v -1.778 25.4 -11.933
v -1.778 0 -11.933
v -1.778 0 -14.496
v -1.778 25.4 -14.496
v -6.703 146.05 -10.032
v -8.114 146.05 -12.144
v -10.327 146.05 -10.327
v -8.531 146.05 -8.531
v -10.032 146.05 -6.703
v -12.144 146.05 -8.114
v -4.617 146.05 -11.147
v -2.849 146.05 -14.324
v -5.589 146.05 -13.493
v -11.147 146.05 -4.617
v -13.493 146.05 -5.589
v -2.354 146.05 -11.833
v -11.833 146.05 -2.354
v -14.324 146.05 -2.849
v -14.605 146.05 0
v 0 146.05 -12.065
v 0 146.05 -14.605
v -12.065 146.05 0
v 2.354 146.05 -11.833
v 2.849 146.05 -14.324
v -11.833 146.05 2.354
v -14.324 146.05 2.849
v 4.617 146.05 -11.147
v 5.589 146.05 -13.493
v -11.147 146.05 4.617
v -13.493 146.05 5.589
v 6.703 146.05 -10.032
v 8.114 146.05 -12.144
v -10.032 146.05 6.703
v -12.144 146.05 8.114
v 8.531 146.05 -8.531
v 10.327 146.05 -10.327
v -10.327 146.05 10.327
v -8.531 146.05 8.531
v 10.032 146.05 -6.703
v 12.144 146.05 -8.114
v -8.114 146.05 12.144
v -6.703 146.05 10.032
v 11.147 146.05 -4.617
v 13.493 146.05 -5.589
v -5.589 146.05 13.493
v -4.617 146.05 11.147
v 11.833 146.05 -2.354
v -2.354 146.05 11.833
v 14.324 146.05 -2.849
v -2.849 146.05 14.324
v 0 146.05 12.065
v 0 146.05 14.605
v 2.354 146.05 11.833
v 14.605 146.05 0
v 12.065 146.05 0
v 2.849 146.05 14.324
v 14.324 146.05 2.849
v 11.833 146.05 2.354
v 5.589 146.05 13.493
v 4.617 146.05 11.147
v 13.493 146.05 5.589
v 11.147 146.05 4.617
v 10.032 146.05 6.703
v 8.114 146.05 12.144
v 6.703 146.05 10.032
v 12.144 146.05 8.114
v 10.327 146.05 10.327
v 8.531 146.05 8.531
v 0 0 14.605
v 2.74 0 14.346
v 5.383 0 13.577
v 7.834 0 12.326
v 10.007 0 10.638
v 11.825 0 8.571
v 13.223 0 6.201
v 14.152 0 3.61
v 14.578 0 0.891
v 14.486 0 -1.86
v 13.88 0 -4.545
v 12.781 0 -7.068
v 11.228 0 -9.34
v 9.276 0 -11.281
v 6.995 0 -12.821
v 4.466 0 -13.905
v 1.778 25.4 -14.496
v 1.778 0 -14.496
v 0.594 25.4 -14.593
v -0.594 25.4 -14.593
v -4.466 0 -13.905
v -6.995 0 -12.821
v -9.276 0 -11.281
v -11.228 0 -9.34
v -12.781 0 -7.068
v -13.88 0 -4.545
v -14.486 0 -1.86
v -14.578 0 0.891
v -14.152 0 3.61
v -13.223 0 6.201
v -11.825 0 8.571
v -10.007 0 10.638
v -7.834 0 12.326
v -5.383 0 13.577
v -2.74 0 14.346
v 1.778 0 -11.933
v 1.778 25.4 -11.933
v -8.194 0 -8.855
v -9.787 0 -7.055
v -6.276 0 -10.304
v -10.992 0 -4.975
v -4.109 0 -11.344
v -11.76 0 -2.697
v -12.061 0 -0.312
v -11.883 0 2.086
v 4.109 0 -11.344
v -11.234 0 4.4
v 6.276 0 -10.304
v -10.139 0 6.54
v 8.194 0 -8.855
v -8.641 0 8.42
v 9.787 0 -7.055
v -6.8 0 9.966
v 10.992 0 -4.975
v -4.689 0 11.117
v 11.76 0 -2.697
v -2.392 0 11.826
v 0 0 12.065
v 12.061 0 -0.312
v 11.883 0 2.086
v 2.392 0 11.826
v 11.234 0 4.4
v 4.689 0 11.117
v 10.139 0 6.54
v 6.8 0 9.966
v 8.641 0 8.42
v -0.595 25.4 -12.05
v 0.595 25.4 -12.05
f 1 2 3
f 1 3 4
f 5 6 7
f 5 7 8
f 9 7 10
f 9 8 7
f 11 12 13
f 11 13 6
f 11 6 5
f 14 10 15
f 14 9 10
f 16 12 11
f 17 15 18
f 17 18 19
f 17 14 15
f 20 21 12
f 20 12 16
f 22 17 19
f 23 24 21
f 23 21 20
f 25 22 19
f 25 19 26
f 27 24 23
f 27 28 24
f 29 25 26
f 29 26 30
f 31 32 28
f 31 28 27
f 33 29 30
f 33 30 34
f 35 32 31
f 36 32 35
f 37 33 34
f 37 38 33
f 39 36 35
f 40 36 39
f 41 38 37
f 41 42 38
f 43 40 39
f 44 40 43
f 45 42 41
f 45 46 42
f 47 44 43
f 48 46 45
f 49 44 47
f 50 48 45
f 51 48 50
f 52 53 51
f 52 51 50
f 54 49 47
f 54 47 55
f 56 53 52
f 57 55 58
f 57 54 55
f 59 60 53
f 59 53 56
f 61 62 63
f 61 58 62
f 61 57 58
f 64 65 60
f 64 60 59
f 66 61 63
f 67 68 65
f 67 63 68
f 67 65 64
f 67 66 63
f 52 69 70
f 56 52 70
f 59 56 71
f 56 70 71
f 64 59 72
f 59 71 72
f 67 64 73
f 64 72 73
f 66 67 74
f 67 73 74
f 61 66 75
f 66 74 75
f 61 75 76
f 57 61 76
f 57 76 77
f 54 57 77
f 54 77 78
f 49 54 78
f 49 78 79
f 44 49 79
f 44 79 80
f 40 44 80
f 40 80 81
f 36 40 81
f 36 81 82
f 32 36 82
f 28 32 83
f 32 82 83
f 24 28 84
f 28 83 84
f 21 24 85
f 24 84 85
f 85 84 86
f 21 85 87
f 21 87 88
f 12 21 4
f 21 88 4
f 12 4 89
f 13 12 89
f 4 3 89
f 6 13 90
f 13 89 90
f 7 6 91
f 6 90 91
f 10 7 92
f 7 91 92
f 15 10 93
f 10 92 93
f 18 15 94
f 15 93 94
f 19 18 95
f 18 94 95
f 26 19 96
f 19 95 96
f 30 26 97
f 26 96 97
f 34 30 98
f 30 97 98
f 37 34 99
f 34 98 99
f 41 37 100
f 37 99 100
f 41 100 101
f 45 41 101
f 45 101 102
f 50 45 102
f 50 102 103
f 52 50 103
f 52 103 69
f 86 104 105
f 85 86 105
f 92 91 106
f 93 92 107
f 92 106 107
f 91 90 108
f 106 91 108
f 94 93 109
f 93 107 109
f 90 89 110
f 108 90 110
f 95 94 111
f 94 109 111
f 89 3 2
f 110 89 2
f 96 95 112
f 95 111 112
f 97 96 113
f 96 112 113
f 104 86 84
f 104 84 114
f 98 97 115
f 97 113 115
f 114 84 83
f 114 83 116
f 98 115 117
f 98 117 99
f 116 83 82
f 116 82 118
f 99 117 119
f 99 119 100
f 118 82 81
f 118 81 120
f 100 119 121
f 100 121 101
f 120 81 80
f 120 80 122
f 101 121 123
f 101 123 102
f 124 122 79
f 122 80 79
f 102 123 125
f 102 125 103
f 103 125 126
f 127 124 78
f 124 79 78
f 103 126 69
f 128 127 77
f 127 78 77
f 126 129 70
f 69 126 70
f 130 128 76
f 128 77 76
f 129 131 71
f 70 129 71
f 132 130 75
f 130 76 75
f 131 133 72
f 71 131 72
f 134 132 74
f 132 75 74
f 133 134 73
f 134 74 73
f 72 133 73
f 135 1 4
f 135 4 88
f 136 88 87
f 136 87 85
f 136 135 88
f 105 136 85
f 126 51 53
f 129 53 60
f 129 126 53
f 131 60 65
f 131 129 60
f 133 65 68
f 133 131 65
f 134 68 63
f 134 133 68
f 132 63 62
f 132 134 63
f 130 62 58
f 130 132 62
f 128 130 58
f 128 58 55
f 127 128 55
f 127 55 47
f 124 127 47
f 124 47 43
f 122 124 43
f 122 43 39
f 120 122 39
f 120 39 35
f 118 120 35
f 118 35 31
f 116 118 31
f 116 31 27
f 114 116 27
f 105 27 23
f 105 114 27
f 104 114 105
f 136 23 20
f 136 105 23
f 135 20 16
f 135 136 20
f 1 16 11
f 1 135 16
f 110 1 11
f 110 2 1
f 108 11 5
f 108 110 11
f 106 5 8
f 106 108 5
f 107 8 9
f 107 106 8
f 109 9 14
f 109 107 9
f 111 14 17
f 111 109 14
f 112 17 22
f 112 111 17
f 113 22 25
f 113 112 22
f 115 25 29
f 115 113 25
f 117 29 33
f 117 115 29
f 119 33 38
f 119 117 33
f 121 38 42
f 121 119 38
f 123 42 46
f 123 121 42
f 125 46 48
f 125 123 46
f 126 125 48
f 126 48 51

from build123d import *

# Parameters (mm, degrees)
SKETCH1_R           = 14.605
SKETCH1_R_2         = 12.065
BOSS_EXTRUDE1_DEPTH = 146.05
SKETCH2_W           = 3.556
SKETCH2_H           = 25.4
CUT_EXTRUDE1_DEPTH  = 25.4


with BuildPart() as part:
    # Sketch1 → Boss-Extrude1 (new body)
    with BuildSketch(Plane(origin=(0, 0, 0), x_dir=(1, 0, 0), z_dir=(0, 1, 0))):
        with Locations(Location((0, 0, 0), (0, 0, 270))):
            Circle(SKETCH1_R)
        with Locations(Location((0, 0, 0), (0, 0, 270))):
            Circle(SKETCH1_R_2, mode=Mode.SUBTRACT)
    extrude(amount=BOSS_EXTRUDE1_DEPTH)

    # Sketch2 → Cut-Extrude1 (cut)
    with BuildSketch(Plane.XY):
        with Locations((0, 12.7)):
            Rectangle(SKETCH2_W, SKETCH2_H)
    extrude(amount=-CUT_EXTRUDE1_DEPTH, mode=Mode.SUBTRACT)


solid = part.part
